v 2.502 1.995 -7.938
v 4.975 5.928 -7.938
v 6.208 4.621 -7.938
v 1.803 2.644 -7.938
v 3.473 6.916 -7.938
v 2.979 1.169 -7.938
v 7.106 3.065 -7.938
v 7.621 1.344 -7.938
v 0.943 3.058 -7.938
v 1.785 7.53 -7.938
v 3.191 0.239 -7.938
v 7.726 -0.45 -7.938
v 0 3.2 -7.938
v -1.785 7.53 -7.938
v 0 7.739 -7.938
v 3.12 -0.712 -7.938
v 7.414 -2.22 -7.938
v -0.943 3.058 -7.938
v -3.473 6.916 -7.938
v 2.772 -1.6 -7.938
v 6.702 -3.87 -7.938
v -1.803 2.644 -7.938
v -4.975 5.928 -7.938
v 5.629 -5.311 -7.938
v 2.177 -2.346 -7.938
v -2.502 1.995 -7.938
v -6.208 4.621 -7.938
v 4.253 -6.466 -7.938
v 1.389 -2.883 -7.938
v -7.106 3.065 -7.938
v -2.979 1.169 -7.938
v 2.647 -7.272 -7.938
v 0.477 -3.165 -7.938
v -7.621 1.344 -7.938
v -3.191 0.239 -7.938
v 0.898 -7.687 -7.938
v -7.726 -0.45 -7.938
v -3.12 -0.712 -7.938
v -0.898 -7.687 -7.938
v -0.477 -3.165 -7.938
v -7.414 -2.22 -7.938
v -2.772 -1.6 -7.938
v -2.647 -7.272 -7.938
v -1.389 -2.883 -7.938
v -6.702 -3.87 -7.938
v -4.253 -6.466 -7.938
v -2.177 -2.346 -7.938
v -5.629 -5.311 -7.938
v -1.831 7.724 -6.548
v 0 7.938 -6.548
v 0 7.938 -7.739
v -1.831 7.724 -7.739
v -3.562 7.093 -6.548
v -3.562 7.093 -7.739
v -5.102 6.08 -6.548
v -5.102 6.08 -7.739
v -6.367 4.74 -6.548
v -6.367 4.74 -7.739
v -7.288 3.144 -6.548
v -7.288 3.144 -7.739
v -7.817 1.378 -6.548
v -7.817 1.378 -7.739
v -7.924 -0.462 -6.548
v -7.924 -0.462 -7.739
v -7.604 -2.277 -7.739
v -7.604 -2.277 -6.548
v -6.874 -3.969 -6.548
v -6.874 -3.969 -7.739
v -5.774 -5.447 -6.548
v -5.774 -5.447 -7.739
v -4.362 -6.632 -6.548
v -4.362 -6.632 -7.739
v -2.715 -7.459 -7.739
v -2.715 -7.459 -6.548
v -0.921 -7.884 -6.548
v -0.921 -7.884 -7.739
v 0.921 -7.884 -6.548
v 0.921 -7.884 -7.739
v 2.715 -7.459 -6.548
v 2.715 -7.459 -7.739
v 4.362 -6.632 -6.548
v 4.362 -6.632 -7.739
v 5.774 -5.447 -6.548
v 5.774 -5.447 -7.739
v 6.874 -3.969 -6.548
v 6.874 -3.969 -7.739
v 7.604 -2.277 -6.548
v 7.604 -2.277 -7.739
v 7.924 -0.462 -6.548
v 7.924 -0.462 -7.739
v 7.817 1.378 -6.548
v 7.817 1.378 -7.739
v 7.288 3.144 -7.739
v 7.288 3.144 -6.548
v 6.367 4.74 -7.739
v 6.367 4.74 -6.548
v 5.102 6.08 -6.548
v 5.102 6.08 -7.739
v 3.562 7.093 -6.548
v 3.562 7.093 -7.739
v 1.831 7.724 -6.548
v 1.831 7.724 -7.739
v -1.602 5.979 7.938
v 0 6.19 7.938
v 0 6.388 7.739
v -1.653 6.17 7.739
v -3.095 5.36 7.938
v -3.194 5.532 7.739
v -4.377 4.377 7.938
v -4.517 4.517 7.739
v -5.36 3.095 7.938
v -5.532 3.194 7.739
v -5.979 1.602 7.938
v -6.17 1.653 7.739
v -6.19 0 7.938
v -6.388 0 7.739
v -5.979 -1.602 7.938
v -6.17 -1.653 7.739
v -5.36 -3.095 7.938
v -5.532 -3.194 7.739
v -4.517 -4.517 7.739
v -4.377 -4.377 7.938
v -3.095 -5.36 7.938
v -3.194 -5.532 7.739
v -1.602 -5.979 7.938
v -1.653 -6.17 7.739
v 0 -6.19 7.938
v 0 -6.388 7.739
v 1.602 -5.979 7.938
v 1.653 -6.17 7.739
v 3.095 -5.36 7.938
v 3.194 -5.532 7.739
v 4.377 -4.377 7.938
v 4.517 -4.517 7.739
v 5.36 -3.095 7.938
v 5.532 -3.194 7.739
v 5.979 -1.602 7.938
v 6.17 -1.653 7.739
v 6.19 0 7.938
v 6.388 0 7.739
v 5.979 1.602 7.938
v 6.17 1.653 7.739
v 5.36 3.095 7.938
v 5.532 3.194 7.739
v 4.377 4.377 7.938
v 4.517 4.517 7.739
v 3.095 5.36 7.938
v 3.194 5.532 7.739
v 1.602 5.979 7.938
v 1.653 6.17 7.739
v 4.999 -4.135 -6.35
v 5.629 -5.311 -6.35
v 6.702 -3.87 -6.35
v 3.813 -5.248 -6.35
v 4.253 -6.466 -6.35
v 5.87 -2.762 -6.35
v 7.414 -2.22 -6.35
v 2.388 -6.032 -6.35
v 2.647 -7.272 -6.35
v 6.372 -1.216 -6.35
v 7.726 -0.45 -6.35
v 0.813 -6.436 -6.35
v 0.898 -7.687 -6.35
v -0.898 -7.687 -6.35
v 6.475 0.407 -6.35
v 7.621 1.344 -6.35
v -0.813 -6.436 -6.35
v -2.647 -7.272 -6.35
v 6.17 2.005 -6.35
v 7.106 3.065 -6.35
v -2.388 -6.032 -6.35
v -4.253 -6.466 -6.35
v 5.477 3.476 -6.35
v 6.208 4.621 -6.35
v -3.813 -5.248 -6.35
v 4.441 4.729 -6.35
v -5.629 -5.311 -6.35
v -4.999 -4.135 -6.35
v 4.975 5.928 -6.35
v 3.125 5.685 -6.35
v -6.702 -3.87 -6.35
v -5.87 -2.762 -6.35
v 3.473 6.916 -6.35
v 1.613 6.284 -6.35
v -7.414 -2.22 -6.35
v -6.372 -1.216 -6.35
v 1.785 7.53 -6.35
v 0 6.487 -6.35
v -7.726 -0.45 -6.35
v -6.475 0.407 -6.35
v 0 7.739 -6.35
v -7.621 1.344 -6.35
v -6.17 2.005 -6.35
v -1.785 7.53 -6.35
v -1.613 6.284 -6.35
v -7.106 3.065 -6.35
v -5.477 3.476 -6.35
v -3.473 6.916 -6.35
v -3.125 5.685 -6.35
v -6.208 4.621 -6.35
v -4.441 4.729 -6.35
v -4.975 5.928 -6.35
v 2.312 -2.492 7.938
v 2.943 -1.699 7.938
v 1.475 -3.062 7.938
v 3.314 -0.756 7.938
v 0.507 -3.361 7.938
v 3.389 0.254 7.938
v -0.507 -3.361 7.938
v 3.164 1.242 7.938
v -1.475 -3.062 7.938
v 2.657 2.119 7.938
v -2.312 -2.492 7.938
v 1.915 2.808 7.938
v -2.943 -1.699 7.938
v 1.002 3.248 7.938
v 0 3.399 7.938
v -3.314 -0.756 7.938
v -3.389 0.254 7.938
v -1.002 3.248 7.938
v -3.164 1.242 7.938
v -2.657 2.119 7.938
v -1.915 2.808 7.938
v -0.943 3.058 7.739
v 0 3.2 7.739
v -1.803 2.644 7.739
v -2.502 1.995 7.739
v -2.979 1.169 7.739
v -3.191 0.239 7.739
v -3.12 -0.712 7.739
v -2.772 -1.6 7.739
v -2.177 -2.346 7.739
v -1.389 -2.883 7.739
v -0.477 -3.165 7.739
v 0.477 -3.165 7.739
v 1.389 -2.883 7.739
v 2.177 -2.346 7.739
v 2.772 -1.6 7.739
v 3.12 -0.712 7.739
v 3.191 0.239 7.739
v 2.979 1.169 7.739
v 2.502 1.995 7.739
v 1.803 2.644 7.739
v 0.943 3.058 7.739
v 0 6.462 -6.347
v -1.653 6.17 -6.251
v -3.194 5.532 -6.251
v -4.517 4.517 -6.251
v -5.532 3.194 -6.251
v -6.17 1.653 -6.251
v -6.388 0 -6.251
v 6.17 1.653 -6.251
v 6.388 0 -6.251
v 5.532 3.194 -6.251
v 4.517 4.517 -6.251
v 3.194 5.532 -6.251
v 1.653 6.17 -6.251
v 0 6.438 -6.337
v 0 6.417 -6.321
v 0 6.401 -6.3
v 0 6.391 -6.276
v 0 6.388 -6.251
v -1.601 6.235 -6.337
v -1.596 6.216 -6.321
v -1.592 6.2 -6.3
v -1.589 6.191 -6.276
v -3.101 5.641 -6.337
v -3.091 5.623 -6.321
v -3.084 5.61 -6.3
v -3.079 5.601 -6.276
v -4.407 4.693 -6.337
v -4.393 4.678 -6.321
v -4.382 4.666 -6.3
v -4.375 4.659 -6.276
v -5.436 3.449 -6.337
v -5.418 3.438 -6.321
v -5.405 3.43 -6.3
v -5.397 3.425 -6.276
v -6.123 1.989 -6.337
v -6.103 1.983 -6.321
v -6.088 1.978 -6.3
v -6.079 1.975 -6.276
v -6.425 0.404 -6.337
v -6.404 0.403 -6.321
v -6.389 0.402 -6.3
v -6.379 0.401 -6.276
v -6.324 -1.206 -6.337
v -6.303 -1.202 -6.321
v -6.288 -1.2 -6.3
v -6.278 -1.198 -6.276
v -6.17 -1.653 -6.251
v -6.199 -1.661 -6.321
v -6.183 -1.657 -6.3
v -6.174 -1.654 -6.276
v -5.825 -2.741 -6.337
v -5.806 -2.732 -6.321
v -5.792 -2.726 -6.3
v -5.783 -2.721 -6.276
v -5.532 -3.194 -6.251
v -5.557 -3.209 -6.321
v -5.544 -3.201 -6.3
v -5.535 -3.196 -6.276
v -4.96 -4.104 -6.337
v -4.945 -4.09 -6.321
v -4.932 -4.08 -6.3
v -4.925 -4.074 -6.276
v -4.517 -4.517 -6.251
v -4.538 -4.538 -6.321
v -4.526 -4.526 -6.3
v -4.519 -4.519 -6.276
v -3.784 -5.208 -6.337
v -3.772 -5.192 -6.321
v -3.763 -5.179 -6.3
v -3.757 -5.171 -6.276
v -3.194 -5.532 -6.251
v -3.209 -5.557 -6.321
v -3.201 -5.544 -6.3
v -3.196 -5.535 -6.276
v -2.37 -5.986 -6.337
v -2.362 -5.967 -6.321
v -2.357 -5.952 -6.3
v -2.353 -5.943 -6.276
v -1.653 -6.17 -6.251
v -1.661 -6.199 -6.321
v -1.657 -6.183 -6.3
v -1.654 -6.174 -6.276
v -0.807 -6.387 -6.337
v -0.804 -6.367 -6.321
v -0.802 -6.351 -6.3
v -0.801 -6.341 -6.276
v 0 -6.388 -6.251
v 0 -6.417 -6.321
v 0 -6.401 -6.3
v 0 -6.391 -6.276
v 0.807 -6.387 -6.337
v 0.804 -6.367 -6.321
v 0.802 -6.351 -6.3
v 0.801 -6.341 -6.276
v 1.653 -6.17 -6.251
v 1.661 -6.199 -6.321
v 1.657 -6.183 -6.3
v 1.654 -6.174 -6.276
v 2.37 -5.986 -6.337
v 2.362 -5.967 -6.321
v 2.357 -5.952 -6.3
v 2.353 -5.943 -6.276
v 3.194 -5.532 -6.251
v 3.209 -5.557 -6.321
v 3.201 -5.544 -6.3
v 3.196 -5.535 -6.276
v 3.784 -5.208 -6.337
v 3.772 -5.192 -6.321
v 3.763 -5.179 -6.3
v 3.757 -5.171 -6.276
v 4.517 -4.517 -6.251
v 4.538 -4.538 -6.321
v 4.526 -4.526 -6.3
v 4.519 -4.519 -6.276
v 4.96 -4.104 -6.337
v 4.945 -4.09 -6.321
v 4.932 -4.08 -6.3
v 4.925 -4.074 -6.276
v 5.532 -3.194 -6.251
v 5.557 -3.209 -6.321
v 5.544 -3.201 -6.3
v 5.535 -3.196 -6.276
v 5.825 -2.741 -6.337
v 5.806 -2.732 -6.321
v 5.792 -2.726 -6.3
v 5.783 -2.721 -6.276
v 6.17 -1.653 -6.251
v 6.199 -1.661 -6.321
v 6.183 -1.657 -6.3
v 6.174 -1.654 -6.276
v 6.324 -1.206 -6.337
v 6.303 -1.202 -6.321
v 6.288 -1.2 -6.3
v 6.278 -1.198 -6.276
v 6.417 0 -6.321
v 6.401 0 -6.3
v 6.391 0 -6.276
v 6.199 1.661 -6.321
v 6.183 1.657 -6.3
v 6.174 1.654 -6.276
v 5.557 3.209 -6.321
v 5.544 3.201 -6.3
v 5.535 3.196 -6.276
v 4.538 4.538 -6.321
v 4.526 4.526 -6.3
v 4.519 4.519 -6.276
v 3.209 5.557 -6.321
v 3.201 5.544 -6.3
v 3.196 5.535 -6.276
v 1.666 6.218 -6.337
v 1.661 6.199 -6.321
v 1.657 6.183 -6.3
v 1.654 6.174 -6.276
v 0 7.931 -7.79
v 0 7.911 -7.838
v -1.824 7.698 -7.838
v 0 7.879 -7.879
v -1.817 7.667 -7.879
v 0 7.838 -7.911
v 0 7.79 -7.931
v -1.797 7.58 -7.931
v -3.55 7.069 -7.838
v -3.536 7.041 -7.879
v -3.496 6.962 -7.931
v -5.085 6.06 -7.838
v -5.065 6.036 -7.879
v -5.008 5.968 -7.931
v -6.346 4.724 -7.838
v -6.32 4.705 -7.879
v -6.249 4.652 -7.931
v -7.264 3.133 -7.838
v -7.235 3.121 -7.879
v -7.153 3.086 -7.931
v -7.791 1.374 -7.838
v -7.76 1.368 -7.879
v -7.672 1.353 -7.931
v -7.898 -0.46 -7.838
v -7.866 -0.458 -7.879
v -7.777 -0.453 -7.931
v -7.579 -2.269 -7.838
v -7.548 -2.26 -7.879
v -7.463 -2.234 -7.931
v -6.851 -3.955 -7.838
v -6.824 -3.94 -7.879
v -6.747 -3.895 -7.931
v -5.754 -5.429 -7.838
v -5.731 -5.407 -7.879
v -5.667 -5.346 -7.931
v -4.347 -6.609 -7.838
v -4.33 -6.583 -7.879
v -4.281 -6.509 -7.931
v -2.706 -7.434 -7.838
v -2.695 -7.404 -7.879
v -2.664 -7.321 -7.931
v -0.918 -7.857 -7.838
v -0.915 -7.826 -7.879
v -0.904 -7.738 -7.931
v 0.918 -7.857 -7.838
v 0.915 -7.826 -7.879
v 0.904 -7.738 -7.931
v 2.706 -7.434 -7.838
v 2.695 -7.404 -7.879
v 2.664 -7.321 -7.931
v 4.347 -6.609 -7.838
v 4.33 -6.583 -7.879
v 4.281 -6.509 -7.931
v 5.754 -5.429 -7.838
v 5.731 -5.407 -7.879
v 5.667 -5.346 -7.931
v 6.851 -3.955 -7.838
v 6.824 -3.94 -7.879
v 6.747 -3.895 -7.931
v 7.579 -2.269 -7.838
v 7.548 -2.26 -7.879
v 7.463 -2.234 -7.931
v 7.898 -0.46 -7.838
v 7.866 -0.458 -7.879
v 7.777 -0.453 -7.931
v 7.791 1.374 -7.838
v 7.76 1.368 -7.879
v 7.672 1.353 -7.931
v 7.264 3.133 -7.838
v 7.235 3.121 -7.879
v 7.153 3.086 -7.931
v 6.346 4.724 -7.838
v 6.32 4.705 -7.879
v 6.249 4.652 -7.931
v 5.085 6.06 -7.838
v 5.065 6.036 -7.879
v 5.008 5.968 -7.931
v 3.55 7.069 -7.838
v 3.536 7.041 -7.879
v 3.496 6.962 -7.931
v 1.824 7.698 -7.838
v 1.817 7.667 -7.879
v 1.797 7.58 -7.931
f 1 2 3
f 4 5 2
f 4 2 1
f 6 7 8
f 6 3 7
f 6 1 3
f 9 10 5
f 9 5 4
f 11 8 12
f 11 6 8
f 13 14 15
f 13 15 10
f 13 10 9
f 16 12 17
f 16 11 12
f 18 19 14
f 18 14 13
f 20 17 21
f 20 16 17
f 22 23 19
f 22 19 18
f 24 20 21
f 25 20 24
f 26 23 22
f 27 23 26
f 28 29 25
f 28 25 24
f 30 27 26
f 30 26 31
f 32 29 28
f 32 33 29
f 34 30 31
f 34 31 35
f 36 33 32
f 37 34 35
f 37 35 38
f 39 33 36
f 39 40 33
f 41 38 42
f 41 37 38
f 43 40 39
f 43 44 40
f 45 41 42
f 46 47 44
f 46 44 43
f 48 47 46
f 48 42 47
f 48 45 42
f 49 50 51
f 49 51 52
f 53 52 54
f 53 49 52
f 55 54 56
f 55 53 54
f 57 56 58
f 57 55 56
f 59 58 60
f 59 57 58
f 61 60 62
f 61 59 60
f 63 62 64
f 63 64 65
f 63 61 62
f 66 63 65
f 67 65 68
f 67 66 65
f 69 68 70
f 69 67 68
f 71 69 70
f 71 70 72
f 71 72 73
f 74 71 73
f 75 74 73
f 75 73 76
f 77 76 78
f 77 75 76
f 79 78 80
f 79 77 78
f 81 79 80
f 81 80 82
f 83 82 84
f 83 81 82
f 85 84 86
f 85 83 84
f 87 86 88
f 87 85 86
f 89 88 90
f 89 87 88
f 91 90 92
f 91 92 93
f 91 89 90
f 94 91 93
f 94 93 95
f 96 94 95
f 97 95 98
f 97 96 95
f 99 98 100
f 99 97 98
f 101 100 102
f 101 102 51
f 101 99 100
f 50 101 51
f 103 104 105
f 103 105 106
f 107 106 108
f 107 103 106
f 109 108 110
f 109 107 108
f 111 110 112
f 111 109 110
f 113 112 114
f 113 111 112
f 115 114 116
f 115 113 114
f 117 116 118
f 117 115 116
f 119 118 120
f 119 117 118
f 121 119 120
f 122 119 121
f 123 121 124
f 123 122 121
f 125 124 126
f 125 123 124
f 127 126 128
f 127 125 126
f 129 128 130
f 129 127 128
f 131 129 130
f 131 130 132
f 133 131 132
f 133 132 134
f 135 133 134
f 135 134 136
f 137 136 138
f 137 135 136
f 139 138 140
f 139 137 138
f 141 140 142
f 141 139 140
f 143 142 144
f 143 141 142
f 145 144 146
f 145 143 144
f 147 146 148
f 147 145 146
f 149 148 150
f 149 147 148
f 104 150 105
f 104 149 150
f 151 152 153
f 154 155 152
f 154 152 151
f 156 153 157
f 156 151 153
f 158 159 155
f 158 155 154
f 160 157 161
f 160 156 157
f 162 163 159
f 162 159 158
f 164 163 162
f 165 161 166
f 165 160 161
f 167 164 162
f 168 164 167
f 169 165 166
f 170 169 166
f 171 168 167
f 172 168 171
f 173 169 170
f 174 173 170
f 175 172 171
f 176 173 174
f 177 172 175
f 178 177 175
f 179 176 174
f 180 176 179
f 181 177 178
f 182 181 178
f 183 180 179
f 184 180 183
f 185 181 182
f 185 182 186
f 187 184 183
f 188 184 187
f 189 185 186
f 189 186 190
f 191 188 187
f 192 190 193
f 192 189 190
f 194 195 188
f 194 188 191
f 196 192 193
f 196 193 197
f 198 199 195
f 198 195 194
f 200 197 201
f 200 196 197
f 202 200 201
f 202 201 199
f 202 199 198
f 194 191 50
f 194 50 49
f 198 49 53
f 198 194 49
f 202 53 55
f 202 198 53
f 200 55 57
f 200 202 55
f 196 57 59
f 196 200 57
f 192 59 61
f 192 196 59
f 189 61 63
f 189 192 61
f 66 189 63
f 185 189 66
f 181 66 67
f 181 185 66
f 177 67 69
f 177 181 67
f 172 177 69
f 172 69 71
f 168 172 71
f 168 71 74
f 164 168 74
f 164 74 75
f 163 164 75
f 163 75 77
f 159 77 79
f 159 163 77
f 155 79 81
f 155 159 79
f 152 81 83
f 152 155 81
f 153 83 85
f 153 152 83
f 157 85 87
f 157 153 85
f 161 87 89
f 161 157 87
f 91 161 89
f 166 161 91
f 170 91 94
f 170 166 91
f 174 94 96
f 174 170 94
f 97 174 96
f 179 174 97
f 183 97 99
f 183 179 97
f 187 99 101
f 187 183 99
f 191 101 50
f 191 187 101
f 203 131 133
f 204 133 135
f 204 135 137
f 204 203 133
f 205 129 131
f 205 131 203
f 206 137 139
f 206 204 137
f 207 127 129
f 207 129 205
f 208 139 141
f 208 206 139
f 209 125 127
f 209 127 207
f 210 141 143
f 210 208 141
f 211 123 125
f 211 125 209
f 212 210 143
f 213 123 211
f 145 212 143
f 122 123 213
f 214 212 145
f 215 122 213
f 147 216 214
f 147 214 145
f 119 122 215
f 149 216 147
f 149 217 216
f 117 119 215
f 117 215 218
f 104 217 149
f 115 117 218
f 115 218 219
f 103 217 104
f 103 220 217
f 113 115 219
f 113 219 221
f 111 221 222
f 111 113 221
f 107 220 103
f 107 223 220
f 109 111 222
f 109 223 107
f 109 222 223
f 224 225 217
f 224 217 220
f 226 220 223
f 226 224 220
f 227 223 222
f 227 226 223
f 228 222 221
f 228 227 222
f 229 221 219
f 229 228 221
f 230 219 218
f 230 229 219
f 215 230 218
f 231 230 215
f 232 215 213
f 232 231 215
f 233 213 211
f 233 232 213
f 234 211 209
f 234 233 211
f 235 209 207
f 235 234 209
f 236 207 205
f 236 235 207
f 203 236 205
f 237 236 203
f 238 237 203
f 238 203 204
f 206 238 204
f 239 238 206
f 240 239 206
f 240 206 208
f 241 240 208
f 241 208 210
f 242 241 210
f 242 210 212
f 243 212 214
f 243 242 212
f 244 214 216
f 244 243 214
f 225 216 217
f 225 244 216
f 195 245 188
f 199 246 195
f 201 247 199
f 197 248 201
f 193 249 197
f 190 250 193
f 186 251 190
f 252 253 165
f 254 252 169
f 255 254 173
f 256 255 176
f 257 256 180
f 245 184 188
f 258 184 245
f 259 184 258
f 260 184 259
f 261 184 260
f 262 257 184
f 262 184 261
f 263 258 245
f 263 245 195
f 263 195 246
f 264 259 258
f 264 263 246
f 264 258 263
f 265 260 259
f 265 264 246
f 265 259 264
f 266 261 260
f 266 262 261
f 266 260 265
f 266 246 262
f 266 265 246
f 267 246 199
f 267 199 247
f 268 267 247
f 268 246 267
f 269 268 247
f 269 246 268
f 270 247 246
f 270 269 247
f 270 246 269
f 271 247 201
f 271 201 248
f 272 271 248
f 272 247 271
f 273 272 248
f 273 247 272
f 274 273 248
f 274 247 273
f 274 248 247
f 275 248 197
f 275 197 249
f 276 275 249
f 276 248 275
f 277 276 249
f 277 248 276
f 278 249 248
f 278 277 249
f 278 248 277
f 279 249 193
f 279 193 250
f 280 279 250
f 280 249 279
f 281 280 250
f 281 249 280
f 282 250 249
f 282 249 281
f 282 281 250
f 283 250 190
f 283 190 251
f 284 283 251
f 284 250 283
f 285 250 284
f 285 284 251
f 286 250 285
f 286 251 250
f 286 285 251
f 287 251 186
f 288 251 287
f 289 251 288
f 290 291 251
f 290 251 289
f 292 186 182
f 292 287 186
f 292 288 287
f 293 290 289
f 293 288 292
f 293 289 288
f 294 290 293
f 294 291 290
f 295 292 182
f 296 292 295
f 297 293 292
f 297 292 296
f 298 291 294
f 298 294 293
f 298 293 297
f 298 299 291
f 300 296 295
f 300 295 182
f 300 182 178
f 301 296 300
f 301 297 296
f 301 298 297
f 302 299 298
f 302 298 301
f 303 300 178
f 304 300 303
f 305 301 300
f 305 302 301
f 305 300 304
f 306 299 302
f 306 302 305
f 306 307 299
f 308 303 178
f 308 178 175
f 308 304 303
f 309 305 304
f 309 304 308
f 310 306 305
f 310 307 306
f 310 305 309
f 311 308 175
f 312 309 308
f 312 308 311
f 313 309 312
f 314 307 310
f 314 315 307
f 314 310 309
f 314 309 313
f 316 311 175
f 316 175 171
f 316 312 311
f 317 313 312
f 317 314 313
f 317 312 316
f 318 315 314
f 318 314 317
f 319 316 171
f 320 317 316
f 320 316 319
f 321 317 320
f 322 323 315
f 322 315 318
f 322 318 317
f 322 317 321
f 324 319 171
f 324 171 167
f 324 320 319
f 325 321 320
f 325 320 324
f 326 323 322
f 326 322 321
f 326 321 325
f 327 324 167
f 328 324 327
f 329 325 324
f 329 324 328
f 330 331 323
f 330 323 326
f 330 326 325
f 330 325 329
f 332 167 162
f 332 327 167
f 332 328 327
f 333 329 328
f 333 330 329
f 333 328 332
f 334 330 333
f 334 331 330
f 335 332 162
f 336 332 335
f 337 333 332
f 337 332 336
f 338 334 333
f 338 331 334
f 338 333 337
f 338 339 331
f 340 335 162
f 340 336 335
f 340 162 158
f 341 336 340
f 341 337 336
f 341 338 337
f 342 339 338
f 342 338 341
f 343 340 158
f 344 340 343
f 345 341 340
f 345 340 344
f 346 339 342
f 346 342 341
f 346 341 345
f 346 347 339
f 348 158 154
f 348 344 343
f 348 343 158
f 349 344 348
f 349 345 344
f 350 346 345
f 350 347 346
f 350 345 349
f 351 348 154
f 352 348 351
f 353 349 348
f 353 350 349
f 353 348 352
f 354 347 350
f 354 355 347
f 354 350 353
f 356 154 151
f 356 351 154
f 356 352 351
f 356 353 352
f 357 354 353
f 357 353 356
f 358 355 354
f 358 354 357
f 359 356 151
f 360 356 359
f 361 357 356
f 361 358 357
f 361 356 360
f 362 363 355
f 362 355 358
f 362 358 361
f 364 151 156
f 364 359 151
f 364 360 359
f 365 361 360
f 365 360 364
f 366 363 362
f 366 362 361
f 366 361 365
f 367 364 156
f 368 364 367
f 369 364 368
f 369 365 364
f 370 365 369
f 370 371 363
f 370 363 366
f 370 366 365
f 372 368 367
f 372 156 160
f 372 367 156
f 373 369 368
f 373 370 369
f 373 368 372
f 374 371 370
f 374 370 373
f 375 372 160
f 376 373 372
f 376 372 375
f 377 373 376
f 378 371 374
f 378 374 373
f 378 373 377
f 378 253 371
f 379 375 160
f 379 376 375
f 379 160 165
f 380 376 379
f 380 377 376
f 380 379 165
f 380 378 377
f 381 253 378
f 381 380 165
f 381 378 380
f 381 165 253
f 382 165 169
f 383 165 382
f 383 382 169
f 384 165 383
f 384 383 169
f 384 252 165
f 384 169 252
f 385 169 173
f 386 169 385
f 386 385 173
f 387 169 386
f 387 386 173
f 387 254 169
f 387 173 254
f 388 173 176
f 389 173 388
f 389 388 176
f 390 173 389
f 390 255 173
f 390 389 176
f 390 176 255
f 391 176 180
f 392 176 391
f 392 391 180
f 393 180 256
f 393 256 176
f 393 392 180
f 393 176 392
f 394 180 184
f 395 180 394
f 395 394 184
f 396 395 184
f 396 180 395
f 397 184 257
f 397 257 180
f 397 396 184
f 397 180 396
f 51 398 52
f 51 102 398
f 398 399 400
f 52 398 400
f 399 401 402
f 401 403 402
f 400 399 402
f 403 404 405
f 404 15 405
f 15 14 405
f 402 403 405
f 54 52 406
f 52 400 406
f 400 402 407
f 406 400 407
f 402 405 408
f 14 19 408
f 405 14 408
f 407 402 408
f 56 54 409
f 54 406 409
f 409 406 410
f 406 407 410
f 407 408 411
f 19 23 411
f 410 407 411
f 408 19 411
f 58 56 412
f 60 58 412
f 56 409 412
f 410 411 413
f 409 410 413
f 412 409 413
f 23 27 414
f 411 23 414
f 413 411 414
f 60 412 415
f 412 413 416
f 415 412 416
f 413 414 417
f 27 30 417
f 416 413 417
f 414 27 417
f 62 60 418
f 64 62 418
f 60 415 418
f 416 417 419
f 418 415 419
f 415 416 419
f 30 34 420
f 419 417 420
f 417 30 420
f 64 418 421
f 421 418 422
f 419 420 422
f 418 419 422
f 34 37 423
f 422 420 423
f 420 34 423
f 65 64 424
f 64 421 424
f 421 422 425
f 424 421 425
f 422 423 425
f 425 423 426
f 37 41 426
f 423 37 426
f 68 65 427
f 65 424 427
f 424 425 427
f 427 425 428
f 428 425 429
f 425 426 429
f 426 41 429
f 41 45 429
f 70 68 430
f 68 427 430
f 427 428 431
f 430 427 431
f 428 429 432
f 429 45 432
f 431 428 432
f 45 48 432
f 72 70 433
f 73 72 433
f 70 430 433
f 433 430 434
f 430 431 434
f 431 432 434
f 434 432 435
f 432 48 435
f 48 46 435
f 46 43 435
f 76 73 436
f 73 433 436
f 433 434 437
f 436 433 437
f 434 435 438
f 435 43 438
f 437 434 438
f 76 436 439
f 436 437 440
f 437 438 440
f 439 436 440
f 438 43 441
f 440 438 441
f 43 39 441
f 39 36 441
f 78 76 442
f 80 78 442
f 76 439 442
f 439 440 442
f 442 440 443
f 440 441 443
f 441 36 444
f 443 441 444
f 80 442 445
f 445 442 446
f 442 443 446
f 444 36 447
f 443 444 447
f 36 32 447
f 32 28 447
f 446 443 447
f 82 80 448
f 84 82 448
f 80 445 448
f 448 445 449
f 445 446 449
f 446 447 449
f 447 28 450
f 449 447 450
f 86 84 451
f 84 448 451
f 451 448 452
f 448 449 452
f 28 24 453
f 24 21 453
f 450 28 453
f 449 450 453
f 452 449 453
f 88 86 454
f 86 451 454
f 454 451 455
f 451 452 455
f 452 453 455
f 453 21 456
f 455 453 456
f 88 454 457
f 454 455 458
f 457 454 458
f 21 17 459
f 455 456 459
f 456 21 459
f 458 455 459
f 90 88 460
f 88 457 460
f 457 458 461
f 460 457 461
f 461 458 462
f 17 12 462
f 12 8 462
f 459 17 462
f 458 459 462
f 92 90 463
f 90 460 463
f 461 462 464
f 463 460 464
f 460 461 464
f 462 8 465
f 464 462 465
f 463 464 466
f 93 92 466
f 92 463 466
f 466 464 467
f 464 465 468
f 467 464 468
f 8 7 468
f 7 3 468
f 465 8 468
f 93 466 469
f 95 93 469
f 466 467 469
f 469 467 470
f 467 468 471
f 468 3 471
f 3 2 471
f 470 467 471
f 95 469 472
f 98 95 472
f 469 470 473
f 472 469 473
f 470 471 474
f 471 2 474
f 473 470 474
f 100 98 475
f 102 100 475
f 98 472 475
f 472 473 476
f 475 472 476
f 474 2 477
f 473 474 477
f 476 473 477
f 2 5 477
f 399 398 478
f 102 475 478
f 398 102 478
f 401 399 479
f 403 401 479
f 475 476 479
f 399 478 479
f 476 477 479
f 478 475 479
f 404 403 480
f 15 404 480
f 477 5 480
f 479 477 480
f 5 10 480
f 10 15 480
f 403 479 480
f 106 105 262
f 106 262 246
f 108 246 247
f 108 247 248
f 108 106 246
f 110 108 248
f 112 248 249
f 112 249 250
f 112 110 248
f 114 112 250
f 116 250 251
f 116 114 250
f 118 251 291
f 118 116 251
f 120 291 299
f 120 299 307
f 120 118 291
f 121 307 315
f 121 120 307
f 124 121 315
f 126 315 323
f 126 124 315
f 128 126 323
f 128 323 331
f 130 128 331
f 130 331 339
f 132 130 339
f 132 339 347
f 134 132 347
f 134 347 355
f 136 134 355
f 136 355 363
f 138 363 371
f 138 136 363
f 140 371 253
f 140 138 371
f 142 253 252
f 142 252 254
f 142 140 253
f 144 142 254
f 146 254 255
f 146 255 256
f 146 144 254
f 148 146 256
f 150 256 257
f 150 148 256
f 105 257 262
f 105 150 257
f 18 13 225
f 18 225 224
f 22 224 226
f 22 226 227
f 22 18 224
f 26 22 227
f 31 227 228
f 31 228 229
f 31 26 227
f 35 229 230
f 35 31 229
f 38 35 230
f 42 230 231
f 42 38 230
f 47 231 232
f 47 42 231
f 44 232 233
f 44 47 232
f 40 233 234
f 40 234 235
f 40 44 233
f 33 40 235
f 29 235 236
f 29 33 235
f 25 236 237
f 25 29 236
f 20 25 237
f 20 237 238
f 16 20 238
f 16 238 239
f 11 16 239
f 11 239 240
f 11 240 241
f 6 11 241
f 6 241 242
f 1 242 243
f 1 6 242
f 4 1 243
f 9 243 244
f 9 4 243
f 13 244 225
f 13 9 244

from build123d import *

# Parameters (mm, degrees)
CHAMFER1_SIZE = 0.1984375
FILLET1_R     = 0.1984375
FILLET2_R     = 0.09921875


with BuildPart() as part:
    # Sketch3 → Revolve1 (revolve)
    with BuildSketch(Plane(origin=(0, 0, 0), x_dir=(0, 0, -1), z_dir=(1, 0, 0))):
        Polygon((7.9375, 7.9375), (6.35, 7.9375), (6.35, 6.3881), (-7.9375, 6.3881), (-7.9375, 3.2004), (7.9375, 3.2004), align=None)
    revolve(axis=Axis((0, 0, -7.9375), (0, 0, 1)))

    # Chamfer1
    chamfer1_edges = [part.edges().sort_by_distance(p)[0] for p in [
        (0, -3.2004, 7.9375),
        (0, -6.3881, 7.9375),
        (0, -7.9375, -6.35),
    ]]
    chamfer(chamfer1_edges, length=CHAMFER1_SIZE)

    # Fillet1
    fillet1_edges = [part.edges().sort_by_distance(p)[0] for p in [
        (0, -7.9375, -7.9375),
    ]]
    fillet(fillet1_edges, radius=FILLET1_R)

    # Fillet2
    fillet2_edges = [part.edges().sort_by_distance(p)[0] for p in [
        (0, -6.3881, -6.35),
    ]]
    fillet(fillet2_edges, radius=FILLET2_R)


solid = part.part
